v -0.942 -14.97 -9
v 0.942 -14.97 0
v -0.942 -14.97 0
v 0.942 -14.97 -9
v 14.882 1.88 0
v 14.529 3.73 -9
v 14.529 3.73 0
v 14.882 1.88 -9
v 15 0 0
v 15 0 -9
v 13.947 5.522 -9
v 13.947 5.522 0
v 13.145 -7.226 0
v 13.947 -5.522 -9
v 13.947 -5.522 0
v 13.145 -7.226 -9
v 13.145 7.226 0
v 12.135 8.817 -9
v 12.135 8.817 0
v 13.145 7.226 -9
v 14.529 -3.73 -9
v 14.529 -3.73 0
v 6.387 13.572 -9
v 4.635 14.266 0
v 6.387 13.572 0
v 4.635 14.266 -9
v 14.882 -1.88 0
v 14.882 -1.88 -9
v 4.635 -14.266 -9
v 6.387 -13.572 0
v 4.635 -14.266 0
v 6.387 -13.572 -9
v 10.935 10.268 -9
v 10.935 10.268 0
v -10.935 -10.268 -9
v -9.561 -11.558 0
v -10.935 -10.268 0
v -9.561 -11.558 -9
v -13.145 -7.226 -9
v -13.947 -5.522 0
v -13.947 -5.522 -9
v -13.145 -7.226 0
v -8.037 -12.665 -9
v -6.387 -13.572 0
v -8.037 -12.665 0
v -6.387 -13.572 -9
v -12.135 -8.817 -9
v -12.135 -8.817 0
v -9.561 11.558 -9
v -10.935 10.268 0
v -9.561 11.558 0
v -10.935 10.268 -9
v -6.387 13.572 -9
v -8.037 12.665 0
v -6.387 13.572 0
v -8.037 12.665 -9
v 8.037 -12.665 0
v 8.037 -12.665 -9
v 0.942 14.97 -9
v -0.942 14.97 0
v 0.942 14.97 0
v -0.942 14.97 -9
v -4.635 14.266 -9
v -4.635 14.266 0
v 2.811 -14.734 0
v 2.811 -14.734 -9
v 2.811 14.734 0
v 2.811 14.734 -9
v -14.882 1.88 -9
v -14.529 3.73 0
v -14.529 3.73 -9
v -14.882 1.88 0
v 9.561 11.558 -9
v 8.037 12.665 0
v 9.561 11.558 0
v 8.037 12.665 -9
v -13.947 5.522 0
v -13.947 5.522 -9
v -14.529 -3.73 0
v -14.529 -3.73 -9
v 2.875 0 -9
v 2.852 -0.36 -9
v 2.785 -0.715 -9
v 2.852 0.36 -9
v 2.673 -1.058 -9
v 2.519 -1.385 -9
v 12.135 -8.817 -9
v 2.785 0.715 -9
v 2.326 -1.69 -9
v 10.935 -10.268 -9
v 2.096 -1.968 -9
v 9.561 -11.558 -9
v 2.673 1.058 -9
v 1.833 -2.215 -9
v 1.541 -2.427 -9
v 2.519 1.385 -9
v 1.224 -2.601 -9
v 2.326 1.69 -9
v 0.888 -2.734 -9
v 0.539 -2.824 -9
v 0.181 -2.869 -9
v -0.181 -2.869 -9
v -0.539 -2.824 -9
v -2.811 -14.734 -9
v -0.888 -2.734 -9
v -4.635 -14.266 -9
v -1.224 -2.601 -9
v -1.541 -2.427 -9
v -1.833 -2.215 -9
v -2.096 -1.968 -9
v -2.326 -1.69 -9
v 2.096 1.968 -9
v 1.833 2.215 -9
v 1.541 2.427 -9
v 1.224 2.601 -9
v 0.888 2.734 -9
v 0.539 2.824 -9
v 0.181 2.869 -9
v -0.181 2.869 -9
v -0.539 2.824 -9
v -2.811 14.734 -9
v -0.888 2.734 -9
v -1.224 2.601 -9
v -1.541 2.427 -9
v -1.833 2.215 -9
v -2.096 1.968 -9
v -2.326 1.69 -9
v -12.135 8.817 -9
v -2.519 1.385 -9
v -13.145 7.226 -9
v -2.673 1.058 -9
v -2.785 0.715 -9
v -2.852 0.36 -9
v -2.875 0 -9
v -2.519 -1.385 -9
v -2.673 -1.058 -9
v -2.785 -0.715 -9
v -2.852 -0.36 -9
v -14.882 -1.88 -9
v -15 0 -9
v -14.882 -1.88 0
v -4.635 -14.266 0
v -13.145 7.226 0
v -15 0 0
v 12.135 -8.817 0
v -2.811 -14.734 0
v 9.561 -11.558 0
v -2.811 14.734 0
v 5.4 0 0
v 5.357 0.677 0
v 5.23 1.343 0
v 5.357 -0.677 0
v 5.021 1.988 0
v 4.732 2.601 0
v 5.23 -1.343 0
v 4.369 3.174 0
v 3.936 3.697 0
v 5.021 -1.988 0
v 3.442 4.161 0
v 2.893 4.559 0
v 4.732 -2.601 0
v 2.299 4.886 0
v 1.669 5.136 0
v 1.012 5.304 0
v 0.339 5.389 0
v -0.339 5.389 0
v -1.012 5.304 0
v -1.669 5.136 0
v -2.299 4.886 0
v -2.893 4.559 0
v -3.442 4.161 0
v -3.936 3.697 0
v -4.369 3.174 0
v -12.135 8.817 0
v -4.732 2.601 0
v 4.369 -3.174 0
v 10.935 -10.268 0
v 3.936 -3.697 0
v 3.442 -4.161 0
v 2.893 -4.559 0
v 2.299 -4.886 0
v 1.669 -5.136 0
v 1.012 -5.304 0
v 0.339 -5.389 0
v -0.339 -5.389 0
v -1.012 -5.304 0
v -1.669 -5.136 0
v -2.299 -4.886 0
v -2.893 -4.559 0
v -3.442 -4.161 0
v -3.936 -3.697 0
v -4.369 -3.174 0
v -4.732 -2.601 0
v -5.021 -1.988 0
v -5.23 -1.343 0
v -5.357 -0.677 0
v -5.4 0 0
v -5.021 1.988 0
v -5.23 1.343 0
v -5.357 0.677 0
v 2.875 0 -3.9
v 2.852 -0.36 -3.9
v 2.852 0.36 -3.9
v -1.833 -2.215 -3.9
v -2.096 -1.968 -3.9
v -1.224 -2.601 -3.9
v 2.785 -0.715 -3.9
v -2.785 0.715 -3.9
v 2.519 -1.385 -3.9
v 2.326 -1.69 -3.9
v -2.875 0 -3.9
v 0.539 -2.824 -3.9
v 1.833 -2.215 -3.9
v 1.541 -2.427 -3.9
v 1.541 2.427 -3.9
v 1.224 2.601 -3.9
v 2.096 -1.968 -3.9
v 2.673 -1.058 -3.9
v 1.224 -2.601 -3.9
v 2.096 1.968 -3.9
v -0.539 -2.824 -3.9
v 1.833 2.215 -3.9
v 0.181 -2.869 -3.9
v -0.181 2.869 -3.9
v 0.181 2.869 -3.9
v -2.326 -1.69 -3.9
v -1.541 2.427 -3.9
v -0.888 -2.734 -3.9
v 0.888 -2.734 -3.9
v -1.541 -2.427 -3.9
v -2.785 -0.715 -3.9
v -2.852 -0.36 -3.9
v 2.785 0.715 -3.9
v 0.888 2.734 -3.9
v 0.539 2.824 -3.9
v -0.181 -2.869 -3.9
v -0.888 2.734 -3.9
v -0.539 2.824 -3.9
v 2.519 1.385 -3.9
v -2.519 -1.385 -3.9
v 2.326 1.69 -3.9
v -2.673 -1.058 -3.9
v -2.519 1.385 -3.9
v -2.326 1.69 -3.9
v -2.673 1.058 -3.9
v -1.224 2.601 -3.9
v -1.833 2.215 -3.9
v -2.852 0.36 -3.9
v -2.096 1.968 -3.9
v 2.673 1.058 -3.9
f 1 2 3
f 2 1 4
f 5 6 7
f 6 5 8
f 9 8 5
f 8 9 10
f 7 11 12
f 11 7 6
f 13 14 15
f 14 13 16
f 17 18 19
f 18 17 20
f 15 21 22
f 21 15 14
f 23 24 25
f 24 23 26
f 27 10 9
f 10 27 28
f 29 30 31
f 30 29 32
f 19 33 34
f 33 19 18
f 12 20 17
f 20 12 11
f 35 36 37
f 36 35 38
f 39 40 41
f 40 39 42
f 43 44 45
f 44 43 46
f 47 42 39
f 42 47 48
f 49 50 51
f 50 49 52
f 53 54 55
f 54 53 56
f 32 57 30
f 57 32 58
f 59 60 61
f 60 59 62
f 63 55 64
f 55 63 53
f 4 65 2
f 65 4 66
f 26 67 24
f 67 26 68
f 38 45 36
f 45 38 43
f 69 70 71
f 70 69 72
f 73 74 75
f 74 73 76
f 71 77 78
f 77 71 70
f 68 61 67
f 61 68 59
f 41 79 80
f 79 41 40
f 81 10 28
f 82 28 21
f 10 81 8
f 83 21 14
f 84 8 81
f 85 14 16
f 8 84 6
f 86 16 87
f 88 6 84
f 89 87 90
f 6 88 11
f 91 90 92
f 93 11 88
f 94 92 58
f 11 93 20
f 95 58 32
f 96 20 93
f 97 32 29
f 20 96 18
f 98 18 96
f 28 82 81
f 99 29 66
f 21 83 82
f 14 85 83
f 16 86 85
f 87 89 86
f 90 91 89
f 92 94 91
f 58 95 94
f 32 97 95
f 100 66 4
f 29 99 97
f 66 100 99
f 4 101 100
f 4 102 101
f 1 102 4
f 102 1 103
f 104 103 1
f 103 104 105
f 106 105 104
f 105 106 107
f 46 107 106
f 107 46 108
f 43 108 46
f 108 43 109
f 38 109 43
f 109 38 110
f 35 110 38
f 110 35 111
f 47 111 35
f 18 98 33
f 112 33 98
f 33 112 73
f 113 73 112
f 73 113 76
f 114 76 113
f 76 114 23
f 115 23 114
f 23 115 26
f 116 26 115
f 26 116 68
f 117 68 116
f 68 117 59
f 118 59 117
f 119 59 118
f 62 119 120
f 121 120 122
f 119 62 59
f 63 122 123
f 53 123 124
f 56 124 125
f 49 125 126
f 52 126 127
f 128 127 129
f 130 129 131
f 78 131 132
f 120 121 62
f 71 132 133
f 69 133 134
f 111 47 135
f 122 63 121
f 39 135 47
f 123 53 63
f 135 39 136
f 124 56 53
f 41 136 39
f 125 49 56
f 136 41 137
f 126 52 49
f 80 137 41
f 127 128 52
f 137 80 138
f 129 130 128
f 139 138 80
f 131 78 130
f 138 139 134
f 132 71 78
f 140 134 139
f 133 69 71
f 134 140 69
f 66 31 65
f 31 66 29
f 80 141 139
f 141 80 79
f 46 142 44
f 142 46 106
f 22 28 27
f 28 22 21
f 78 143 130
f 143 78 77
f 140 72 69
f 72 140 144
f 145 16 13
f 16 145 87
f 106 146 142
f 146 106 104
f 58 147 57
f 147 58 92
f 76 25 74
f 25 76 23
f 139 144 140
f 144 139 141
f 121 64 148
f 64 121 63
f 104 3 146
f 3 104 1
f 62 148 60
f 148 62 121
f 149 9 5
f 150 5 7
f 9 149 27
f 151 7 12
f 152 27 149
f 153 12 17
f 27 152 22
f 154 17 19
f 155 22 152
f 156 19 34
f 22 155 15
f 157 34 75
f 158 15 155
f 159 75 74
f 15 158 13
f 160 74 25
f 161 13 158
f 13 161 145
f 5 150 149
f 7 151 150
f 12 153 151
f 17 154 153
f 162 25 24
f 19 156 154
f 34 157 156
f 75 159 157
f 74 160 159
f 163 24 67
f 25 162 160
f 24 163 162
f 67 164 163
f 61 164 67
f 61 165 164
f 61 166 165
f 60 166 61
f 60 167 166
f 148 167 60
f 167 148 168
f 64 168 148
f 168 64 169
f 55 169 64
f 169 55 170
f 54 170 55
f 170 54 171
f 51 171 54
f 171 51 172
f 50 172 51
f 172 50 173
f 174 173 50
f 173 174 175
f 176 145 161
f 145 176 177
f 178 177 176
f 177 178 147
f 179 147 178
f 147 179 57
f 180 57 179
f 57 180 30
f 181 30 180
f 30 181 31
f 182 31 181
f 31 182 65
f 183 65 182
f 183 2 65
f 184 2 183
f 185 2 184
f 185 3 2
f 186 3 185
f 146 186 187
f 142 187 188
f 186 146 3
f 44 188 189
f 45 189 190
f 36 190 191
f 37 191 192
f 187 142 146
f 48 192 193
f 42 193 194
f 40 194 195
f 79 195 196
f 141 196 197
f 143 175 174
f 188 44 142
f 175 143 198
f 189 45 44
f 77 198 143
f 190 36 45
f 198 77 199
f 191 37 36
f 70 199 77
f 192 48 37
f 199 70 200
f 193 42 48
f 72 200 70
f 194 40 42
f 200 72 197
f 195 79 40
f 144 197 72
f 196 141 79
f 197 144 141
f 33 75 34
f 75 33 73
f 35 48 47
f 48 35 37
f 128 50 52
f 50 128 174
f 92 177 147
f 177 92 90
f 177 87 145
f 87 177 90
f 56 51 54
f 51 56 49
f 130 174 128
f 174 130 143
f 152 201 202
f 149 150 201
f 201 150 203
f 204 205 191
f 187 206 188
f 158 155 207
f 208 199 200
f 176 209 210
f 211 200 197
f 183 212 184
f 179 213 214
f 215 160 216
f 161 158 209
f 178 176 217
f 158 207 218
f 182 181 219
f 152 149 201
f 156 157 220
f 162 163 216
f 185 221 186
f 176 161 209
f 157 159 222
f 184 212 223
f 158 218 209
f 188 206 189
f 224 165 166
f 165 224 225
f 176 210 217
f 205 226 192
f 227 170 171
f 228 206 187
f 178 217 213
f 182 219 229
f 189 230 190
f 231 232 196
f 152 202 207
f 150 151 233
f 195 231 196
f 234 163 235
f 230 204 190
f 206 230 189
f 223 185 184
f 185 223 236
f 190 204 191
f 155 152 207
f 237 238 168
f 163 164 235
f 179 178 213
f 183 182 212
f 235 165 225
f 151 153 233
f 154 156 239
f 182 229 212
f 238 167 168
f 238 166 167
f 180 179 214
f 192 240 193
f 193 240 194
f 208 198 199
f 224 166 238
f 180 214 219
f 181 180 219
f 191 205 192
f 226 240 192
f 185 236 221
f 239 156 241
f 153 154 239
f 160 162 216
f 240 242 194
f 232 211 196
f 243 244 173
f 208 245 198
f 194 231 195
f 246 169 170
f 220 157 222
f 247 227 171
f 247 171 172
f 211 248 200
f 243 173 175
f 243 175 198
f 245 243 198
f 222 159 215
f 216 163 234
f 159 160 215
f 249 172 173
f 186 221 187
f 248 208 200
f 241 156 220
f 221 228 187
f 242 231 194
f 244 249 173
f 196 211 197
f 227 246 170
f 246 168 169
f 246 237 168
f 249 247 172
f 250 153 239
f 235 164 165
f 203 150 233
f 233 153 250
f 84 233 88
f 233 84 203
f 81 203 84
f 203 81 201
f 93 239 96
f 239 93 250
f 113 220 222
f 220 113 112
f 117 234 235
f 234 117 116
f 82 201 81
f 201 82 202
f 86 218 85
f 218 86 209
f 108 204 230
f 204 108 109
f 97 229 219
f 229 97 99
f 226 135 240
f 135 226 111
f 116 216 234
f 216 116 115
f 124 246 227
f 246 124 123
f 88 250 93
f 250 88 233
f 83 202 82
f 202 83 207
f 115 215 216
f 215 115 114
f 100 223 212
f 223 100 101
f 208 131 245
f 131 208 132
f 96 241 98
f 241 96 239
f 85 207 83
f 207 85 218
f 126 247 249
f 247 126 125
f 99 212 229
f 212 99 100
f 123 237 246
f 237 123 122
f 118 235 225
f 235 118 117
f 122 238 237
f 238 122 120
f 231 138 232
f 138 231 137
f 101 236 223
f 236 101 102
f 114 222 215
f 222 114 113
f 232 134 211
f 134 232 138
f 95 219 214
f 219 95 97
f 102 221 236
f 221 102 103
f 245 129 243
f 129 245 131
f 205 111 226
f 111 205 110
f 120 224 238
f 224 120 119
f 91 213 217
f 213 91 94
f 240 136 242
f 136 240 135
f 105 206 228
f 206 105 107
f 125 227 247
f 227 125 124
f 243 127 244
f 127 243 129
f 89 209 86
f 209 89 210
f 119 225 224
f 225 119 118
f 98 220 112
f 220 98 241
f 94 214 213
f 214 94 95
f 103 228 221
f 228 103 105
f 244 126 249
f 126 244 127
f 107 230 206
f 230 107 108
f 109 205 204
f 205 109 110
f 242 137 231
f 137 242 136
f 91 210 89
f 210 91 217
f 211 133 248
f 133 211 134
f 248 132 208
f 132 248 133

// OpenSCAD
$fn = 50;


difference() {
	union() {
		translate(v = [0, 0, -9.0000000000]) {
			cylinder(h = 9, r = 15.0000000000);
		}
		translate(v = [0, 0, -9.0000000000]) {
			cylinder(h = 9, r = 2.8750000000);
		}
	}
	union() {
		translate(v = [0, 0, 0]) {
			rotate(a = [0, 0, 0]) {
				difference() {
					union() {
						#translate(v = [0, 0, -9.0000000000]) {
							cylinder(h = 9, r = 2.6000000000);
						}
						#translate(v = [0, 0, -3.9000000000]) {
							cylinder(h = 3.9000000000, r1 = 2.8750000000, r2 = 5.4000000000);
						}
						#translate(v = [0, 0, -9.0000000000]) {
							cylinder(h = 9, r = 2.8750000000);
						}
						#translate(v = [0, 0, -9.0000000000]) {
							cylinder(h = 9, r = 2.6000000000);
						}
					}
					union();
				}
			}
		}
	}
}
